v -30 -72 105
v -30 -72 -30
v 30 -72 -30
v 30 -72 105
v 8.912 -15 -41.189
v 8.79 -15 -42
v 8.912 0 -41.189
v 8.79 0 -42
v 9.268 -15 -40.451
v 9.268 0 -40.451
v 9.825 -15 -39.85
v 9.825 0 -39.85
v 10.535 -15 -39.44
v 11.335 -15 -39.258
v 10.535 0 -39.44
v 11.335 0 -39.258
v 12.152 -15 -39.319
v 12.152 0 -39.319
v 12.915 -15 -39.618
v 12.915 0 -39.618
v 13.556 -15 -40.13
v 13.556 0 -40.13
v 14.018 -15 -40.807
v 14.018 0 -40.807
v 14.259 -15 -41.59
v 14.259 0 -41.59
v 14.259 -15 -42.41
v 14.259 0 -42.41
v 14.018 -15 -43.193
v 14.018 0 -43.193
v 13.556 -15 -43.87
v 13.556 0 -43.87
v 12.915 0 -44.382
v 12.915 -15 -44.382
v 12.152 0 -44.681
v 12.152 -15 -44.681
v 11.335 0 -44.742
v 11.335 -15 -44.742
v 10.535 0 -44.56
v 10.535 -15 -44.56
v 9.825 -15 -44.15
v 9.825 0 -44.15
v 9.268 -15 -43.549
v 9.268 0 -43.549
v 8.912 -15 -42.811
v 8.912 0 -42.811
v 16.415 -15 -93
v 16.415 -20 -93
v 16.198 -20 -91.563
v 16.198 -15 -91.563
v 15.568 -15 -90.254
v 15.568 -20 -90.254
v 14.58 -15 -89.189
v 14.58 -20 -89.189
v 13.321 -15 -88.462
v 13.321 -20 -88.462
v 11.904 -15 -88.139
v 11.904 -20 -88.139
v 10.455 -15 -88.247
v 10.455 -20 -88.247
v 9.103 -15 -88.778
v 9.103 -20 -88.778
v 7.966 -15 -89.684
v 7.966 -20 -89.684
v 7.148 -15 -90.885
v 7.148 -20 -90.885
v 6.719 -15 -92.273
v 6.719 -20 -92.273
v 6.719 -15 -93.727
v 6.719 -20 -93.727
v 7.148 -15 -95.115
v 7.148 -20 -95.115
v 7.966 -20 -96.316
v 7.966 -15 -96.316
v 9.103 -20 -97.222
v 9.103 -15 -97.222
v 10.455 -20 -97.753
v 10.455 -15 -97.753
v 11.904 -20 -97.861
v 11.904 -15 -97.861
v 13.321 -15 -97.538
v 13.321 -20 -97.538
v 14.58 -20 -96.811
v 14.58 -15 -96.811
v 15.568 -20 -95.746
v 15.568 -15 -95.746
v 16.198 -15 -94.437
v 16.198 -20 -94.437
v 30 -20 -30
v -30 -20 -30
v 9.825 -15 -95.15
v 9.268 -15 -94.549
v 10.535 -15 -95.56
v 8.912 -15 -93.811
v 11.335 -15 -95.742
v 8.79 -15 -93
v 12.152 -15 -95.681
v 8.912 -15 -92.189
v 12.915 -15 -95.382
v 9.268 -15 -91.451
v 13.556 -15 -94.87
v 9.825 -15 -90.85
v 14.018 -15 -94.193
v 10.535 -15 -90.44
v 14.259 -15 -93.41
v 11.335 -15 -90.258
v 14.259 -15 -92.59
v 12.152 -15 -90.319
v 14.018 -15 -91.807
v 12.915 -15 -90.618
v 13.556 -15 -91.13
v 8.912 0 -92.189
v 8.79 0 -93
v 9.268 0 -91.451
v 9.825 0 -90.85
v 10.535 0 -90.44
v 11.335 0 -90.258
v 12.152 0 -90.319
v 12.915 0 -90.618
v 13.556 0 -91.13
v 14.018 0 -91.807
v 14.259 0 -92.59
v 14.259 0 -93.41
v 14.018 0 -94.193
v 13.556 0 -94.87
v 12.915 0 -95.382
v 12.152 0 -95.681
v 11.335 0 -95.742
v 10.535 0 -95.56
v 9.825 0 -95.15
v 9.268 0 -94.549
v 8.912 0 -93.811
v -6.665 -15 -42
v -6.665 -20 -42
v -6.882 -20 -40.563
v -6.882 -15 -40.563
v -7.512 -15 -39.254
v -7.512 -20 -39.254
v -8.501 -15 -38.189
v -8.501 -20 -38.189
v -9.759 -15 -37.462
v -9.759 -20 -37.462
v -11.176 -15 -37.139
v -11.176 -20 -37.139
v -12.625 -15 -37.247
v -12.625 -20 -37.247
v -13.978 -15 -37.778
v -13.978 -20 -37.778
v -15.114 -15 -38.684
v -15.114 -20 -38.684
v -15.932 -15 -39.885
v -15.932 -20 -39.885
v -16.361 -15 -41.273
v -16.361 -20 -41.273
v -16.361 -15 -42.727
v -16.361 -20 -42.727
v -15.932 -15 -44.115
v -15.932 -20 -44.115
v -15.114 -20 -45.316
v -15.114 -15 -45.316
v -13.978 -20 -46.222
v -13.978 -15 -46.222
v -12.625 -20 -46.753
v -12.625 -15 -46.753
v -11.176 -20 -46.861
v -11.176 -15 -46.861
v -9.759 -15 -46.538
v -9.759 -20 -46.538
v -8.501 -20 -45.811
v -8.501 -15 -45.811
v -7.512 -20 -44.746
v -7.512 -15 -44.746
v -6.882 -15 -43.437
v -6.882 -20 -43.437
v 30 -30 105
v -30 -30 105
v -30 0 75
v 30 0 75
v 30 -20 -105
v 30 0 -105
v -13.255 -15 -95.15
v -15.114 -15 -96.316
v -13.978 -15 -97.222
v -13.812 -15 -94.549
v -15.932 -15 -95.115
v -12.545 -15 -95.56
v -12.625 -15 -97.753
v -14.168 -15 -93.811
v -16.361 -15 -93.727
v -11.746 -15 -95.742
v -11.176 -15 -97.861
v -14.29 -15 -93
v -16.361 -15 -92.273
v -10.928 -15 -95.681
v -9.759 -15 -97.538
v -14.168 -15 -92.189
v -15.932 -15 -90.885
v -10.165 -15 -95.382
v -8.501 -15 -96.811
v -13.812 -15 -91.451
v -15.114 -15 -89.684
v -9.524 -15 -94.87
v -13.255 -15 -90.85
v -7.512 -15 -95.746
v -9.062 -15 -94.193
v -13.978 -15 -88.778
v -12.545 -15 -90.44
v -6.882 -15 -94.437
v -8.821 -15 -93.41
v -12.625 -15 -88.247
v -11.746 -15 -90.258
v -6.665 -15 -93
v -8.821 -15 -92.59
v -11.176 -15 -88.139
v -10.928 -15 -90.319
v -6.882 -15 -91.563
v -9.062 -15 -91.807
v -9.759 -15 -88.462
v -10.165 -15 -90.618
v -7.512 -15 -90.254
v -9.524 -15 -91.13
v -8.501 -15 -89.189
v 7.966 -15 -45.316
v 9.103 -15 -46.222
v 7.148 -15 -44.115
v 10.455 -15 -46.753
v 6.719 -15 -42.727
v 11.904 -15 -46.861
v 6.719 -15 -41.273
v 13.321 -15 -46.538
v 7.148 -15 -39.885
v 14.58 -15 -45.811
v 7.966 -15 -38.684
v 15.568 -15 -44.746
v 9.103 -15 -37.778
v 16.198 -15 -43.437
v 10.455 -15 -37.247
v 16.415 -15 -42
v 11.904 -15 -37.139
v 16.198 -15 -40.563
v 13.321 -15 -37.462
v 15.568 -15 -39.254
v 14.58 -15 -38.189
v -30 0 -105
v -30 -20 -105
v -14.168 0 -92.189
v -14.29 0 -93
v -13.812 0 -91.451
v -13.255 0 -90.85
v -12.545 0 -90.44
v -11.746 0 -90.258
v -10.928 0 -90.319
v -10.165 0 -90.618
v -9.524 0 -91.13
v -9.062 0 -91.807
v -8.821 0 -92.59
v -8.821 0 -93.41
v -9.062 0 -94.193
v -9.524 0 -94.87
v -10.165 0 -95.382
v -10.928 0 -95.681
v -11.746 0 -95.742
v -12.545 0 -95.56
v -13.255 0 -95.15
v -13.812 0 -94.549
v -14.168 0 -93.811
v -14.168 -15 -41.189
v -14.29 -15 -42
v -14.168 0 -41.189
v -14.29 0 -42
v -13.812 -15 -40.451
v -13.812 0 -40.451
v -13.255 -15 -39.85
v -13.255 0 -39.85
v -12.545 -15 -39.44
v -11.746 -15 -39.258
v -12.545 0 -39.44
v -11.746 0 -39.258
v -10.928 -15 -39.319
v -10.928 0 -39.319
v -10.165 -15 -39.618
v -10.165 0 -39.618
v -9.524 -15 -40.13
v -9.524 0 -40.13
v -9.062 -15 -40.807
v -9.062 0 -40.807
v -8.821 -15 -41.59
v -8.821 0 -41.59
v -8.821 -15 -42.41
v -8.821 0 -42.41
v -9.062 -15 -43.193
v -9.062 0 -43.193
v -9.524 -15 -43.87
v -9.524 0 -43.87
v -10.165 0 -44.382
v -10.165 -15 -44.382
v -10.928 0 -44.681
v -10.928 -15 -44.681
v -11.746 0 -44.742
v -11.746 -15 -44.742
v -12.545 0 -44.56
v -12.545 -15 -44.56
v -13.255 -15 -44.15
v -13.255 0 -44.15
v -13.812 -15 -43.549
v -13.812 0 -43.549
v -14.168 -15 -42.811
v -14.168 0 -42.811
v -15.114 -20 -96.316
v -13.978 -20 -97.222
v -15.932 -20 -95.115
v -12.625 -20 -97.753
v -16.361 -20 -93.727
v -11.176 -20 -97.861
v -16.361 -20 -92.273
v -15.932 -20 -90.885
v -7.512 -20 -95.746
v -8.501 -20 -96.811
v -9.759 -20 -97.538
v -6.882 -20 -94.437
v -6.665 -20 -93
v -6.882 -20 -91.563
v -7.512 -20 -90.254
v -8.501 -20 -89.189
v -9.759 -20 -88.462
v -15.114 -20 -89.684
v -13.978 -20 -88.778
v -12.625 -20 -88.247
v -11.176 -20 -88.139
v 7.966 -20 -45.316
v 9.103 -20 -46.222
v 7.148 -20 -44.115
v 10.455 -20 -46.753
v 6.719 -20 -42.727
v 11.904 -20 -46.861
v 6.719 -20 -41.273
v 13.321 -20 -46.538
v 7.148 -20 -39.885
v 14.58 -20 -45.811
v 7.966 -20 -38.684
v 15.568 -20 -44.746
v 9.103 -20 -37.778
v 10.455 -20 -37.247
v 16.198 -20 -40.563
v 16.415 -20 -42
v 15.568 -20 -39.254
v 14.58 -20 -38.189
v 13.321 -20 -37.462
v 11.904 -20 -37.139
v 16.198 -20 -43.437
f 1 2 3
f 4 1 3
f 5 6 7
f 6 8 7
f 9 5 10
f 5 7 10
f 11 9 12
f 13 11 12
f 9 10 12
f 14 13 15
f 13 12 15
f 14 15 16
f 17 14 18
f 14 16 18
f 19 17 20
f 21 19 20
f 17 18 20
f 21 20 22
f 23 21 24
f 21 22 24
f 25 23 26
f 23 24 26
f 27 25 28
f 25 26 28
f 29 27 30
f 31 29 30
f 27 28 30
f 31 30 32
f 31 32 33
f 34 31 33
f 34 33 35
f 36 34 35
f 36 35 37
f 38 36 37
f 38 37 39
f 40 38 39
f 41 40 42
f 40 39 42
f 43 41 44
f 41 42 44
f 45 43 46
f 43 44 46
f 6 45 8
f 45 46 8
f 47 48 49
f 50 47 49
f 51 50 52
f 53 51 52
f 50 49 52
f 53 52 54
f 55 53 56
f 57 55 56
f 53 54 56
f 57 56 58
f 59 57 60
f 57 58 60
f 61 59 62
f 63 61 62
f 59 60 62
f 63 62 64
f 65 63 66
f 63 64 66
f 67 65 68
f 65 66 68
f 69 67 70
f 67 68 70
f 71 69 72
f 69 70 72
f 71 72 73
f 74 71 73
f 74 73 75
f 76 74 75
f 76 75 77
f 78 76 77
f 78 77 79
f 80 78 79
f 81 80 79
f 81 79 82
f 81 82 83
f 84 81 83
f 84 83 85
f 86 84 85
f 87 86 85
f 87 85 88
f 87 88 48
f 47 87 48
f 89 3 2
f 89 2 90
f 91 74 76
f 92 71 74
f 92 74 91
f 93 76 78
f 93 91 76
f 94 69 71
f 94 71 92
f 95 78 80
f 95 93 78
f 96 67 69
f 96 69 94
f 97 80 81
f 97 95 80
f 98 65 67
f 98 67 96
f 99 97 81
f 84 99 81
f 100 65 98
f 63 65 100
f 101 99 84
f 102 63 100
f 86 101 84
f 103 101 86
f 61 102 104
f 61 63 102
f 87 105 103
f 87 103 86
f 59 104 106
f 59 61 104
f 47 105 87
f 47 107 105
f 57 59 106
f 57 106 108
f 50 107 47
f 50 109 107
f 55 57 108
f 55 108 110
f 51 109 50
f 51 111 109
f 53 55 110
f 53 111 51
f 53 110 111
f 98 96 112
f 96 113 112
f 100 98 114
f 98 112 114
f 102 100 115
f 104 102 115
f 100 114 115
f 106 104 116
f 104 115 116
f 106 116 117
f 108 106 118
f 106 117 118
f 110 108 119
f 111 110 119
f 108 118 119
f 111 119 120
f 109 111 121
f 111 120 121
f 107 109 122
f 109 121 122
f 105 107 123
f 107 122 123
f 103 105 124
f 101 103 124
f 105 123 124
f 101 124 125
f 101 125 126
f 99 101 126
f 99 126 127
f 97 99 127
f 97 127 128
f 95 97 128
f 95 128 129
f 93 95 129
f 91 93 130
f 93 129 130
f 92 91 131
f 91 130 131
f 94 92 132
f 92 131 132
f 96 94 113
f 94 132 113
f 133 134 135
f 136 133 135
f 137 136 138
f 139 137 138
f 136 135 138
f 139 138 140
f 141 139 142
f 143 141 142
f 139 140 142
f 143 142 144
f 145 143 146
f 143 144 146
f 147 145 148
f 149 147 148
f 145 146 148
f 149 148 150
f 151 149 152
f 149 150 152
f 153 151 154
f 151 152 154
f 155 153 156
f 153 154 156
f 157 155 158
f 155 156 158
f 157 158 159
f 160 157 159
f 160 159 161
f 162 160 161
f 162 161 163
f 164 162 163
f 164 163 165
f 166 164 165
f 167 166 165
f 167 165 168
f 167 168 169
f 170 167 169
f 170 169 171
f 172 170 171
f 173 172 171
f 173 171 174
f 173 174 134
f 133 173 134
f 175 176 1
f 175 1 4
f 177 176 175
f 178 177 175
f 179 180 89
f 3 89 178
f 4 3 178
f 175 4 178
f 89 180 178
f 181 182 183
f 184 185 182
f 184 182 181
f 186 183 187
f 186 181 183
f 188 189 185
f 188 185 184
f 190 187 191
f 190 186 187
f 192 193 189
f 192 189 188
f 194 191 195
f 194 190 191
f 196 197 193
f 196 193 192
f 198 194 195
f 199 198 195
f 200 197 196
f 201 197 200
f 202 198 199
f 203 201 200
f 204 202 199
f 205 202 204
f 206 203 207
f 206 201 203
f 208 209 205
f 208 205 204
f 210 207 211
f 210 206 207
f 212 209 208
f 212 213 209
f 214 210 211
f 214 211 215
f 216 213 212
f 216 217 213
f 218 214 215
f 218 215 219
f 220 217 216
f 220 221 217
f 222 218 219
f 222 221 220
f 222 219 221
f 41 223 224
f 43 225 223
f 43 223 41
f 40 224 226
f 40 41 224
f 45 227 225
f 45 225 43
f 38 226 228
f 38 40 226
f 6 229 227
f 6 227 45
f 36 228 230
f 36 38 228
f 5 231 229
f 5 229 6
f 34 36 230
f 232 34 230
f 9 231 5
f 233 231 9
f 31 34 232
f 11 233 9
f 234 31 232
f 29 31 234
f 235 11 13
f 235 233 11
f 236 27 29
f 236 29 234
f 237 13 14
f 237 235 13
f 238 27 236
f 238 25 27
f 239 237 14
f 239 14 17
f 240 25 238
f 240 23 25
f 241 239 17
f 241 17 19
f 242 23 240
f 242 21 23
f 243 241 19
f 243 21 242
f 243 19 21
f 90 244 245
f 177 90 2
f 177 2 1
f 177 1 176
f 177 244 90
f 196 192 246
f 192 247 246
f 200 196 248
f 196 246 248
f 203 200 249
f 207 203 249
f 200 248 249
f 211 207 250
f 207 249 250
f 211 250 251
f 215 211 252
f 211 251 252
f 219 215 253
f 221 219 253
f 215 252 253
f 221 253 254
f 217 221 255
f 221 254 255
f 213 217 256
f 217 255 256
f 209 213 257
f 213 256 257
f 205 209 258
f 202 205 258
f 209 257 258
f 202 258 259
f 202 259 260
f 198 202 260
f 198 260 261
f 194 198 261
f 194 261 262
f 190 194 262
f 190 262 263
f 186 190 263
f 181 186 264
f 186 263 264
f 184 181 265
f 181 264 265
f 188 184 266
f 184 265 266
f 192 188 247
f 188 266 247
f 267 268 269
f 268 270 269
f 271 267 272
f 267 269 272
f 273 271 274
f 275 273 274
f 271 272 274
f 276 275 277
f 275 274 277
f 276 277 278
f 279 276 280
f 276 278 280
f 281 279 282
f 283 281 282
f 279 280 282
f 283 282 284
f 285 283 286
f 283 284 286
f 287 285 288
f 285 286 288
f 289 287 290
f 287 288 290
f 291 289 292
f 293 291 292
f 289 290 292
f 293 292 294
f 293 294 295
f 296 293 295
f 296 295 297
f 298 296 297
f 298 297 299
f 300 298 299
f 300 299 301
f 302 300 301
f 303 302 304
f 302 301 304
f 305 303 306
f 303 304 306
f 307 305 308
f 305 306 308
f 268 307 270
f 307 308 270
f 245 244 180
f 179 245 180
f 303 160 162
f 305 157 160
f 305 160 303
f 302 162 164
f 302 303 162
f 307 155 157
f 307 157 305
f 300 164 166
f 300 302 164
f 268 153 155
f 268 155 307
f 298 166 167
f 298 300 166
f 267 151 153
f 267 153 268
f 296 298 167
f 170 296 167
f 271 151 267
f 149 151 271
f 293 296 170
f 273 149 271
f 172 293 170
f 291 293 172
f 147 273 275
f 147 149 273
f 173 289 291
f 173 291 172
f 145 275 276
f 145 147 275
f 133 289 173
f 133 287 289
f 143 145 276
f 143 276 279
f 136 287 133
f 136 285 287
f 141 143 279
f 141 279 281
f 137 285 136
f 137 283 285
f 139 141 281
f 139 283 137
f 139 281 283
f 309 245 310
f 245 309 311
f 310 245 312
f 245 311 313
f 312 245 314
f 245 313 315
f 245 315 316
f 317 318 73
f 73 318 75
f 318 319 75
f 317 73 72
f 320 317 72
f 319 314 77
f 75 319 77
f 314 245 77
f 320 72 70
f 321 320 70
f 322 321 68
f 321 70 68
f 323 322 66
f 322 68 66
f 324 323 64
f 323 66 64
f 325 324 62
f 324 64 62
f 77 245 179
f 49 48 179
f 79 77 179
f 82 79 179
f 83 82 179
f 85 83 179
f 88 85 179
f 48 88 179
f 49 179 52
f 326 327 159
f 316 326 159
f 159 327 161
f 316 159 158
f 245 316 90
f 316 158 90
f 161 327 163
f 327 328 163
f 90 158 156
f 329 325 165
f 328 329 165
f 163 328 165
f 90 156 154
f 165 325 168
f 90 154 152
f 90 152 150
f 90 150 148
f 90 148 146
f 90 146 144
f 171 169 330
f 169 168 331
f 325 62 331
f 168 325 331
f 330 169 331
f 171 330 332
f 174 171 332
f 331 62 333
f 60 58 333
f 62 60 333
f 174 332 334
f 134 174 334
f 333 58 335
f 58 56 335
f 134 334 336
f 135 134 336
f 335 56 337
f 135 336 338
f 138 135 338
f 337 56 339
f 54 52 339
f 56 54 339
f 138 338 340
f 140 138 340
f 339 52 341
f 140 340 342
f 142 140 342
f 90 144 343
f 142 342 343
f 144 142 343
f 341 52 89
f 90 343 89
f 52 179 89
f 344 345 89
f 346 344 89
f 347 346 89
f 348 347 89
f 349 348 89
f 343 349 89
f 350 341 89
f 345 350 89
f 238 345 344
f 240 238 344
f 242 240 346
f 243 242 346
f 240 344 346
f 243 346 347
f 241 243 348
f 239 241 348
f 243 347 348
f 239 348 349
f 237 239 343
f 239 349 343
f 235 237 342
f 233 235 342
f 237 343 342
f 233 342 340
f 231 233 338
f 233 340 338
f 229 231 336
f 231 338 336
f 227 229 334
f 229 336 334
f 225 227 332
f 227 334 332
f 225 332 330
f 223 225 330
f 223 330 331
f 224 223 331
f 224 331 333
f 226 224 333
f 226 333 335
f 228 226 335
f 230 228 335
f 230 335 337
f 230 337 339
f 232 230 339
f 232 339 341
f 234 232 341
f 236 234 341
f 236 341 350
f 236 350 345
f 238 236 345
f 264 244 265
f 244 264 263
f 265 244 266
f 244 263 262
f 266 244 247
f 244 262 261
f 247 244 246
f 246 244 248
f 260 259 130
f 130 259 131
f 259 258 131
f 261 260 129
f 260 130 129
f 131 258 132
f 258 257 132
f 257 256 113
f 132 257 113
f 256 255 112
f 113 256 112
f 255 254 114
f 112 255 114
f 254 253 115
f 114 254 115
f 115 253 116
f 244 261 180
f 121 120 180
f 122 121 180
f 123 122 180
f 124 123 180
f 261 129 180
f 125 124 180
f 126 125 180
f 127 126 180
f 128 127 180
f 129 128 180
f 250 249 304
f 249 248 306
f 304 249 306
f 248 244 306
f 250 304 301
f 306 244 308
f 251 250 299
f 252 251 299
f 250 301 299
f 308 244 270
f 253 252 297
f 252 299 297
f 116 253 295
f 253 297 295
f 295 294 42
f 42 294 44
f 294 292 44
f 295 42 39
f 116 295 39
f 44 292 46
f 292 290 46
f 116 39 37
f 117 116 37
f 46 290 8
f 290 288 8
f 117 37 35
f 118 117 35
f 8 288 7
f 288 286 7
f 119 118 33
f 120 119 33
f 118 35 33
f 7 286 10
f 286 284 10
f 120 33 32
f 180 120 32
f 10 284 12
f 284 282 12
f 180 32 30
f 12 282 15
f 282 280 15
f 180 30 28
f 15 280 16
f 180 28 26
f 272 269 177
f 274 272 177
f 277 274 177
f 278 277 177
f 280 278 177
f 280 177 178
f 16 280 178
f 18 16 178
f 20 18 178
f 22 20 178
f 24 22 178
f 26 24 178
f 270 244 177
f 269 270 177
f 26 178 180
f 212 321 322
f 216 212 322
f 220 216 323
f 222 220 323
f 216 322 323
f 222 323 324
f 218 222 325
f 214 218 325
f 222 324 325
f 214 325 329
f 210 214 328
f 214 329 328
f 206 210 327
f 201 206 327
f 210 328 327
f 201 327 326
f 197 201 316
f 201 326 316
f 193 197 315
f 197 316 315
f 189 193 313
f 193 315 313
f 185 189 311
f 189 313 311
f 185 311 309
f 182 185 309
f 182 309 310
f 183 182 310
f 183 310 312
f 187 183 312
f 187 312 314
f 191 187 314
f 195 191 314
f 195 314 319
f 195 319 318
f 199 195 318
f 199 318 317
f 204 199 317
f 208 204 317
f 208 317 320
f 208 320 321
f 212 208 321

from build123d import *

# Parameters (mm, degrees)
F0_W           = 60
F0_H           = 210
F1_DEPTH       = 72
F2_W           = 52
F2_H           = 75
F3_DEPTH       = 60.001
F4_SIZE        = 30
F7_D           = 5.5
F7_CBORE_D     = 9.75
F7_CBORE_DEPTH = 5


with BuildPart() as f1:
    # F0 (on Front) → F1 (new body)
    with BuildSketch(Plane.XZ):
        Rectangle(F0_W, F0_H)
    extrude(amount=F1_DEPTH)

    # F2 (on face) → F3 (cut, through all)
    with BuildSketch(Plane.YZ.offset(30)):
        with Locations((-46, -67.5)):
            Rectangle(F2_W, F2_H)
    extrude(amount=-F3_DEPTH, mode=Mode.SUBTRACT)

    # F4
    f4_edges = [f1.edges().sort_by_distance(p)[0] for p in [
        (0, 0, 105),
    ]]
    chamfer(f4_edges, length=F4_SIZE)

    # F7 (through all)
    with Locations(Plane.XZ.offset(20)):
        with Locations((-11.5400338545, -42), (11.5400338545, -42), (-11.5400338545, -93), (11.5400338545, -93)):
            CounterBoreHole(F7_D / 2, F7_CBORE_D / 2, F7_CBORE_DEPTH)


solid = f1.part
